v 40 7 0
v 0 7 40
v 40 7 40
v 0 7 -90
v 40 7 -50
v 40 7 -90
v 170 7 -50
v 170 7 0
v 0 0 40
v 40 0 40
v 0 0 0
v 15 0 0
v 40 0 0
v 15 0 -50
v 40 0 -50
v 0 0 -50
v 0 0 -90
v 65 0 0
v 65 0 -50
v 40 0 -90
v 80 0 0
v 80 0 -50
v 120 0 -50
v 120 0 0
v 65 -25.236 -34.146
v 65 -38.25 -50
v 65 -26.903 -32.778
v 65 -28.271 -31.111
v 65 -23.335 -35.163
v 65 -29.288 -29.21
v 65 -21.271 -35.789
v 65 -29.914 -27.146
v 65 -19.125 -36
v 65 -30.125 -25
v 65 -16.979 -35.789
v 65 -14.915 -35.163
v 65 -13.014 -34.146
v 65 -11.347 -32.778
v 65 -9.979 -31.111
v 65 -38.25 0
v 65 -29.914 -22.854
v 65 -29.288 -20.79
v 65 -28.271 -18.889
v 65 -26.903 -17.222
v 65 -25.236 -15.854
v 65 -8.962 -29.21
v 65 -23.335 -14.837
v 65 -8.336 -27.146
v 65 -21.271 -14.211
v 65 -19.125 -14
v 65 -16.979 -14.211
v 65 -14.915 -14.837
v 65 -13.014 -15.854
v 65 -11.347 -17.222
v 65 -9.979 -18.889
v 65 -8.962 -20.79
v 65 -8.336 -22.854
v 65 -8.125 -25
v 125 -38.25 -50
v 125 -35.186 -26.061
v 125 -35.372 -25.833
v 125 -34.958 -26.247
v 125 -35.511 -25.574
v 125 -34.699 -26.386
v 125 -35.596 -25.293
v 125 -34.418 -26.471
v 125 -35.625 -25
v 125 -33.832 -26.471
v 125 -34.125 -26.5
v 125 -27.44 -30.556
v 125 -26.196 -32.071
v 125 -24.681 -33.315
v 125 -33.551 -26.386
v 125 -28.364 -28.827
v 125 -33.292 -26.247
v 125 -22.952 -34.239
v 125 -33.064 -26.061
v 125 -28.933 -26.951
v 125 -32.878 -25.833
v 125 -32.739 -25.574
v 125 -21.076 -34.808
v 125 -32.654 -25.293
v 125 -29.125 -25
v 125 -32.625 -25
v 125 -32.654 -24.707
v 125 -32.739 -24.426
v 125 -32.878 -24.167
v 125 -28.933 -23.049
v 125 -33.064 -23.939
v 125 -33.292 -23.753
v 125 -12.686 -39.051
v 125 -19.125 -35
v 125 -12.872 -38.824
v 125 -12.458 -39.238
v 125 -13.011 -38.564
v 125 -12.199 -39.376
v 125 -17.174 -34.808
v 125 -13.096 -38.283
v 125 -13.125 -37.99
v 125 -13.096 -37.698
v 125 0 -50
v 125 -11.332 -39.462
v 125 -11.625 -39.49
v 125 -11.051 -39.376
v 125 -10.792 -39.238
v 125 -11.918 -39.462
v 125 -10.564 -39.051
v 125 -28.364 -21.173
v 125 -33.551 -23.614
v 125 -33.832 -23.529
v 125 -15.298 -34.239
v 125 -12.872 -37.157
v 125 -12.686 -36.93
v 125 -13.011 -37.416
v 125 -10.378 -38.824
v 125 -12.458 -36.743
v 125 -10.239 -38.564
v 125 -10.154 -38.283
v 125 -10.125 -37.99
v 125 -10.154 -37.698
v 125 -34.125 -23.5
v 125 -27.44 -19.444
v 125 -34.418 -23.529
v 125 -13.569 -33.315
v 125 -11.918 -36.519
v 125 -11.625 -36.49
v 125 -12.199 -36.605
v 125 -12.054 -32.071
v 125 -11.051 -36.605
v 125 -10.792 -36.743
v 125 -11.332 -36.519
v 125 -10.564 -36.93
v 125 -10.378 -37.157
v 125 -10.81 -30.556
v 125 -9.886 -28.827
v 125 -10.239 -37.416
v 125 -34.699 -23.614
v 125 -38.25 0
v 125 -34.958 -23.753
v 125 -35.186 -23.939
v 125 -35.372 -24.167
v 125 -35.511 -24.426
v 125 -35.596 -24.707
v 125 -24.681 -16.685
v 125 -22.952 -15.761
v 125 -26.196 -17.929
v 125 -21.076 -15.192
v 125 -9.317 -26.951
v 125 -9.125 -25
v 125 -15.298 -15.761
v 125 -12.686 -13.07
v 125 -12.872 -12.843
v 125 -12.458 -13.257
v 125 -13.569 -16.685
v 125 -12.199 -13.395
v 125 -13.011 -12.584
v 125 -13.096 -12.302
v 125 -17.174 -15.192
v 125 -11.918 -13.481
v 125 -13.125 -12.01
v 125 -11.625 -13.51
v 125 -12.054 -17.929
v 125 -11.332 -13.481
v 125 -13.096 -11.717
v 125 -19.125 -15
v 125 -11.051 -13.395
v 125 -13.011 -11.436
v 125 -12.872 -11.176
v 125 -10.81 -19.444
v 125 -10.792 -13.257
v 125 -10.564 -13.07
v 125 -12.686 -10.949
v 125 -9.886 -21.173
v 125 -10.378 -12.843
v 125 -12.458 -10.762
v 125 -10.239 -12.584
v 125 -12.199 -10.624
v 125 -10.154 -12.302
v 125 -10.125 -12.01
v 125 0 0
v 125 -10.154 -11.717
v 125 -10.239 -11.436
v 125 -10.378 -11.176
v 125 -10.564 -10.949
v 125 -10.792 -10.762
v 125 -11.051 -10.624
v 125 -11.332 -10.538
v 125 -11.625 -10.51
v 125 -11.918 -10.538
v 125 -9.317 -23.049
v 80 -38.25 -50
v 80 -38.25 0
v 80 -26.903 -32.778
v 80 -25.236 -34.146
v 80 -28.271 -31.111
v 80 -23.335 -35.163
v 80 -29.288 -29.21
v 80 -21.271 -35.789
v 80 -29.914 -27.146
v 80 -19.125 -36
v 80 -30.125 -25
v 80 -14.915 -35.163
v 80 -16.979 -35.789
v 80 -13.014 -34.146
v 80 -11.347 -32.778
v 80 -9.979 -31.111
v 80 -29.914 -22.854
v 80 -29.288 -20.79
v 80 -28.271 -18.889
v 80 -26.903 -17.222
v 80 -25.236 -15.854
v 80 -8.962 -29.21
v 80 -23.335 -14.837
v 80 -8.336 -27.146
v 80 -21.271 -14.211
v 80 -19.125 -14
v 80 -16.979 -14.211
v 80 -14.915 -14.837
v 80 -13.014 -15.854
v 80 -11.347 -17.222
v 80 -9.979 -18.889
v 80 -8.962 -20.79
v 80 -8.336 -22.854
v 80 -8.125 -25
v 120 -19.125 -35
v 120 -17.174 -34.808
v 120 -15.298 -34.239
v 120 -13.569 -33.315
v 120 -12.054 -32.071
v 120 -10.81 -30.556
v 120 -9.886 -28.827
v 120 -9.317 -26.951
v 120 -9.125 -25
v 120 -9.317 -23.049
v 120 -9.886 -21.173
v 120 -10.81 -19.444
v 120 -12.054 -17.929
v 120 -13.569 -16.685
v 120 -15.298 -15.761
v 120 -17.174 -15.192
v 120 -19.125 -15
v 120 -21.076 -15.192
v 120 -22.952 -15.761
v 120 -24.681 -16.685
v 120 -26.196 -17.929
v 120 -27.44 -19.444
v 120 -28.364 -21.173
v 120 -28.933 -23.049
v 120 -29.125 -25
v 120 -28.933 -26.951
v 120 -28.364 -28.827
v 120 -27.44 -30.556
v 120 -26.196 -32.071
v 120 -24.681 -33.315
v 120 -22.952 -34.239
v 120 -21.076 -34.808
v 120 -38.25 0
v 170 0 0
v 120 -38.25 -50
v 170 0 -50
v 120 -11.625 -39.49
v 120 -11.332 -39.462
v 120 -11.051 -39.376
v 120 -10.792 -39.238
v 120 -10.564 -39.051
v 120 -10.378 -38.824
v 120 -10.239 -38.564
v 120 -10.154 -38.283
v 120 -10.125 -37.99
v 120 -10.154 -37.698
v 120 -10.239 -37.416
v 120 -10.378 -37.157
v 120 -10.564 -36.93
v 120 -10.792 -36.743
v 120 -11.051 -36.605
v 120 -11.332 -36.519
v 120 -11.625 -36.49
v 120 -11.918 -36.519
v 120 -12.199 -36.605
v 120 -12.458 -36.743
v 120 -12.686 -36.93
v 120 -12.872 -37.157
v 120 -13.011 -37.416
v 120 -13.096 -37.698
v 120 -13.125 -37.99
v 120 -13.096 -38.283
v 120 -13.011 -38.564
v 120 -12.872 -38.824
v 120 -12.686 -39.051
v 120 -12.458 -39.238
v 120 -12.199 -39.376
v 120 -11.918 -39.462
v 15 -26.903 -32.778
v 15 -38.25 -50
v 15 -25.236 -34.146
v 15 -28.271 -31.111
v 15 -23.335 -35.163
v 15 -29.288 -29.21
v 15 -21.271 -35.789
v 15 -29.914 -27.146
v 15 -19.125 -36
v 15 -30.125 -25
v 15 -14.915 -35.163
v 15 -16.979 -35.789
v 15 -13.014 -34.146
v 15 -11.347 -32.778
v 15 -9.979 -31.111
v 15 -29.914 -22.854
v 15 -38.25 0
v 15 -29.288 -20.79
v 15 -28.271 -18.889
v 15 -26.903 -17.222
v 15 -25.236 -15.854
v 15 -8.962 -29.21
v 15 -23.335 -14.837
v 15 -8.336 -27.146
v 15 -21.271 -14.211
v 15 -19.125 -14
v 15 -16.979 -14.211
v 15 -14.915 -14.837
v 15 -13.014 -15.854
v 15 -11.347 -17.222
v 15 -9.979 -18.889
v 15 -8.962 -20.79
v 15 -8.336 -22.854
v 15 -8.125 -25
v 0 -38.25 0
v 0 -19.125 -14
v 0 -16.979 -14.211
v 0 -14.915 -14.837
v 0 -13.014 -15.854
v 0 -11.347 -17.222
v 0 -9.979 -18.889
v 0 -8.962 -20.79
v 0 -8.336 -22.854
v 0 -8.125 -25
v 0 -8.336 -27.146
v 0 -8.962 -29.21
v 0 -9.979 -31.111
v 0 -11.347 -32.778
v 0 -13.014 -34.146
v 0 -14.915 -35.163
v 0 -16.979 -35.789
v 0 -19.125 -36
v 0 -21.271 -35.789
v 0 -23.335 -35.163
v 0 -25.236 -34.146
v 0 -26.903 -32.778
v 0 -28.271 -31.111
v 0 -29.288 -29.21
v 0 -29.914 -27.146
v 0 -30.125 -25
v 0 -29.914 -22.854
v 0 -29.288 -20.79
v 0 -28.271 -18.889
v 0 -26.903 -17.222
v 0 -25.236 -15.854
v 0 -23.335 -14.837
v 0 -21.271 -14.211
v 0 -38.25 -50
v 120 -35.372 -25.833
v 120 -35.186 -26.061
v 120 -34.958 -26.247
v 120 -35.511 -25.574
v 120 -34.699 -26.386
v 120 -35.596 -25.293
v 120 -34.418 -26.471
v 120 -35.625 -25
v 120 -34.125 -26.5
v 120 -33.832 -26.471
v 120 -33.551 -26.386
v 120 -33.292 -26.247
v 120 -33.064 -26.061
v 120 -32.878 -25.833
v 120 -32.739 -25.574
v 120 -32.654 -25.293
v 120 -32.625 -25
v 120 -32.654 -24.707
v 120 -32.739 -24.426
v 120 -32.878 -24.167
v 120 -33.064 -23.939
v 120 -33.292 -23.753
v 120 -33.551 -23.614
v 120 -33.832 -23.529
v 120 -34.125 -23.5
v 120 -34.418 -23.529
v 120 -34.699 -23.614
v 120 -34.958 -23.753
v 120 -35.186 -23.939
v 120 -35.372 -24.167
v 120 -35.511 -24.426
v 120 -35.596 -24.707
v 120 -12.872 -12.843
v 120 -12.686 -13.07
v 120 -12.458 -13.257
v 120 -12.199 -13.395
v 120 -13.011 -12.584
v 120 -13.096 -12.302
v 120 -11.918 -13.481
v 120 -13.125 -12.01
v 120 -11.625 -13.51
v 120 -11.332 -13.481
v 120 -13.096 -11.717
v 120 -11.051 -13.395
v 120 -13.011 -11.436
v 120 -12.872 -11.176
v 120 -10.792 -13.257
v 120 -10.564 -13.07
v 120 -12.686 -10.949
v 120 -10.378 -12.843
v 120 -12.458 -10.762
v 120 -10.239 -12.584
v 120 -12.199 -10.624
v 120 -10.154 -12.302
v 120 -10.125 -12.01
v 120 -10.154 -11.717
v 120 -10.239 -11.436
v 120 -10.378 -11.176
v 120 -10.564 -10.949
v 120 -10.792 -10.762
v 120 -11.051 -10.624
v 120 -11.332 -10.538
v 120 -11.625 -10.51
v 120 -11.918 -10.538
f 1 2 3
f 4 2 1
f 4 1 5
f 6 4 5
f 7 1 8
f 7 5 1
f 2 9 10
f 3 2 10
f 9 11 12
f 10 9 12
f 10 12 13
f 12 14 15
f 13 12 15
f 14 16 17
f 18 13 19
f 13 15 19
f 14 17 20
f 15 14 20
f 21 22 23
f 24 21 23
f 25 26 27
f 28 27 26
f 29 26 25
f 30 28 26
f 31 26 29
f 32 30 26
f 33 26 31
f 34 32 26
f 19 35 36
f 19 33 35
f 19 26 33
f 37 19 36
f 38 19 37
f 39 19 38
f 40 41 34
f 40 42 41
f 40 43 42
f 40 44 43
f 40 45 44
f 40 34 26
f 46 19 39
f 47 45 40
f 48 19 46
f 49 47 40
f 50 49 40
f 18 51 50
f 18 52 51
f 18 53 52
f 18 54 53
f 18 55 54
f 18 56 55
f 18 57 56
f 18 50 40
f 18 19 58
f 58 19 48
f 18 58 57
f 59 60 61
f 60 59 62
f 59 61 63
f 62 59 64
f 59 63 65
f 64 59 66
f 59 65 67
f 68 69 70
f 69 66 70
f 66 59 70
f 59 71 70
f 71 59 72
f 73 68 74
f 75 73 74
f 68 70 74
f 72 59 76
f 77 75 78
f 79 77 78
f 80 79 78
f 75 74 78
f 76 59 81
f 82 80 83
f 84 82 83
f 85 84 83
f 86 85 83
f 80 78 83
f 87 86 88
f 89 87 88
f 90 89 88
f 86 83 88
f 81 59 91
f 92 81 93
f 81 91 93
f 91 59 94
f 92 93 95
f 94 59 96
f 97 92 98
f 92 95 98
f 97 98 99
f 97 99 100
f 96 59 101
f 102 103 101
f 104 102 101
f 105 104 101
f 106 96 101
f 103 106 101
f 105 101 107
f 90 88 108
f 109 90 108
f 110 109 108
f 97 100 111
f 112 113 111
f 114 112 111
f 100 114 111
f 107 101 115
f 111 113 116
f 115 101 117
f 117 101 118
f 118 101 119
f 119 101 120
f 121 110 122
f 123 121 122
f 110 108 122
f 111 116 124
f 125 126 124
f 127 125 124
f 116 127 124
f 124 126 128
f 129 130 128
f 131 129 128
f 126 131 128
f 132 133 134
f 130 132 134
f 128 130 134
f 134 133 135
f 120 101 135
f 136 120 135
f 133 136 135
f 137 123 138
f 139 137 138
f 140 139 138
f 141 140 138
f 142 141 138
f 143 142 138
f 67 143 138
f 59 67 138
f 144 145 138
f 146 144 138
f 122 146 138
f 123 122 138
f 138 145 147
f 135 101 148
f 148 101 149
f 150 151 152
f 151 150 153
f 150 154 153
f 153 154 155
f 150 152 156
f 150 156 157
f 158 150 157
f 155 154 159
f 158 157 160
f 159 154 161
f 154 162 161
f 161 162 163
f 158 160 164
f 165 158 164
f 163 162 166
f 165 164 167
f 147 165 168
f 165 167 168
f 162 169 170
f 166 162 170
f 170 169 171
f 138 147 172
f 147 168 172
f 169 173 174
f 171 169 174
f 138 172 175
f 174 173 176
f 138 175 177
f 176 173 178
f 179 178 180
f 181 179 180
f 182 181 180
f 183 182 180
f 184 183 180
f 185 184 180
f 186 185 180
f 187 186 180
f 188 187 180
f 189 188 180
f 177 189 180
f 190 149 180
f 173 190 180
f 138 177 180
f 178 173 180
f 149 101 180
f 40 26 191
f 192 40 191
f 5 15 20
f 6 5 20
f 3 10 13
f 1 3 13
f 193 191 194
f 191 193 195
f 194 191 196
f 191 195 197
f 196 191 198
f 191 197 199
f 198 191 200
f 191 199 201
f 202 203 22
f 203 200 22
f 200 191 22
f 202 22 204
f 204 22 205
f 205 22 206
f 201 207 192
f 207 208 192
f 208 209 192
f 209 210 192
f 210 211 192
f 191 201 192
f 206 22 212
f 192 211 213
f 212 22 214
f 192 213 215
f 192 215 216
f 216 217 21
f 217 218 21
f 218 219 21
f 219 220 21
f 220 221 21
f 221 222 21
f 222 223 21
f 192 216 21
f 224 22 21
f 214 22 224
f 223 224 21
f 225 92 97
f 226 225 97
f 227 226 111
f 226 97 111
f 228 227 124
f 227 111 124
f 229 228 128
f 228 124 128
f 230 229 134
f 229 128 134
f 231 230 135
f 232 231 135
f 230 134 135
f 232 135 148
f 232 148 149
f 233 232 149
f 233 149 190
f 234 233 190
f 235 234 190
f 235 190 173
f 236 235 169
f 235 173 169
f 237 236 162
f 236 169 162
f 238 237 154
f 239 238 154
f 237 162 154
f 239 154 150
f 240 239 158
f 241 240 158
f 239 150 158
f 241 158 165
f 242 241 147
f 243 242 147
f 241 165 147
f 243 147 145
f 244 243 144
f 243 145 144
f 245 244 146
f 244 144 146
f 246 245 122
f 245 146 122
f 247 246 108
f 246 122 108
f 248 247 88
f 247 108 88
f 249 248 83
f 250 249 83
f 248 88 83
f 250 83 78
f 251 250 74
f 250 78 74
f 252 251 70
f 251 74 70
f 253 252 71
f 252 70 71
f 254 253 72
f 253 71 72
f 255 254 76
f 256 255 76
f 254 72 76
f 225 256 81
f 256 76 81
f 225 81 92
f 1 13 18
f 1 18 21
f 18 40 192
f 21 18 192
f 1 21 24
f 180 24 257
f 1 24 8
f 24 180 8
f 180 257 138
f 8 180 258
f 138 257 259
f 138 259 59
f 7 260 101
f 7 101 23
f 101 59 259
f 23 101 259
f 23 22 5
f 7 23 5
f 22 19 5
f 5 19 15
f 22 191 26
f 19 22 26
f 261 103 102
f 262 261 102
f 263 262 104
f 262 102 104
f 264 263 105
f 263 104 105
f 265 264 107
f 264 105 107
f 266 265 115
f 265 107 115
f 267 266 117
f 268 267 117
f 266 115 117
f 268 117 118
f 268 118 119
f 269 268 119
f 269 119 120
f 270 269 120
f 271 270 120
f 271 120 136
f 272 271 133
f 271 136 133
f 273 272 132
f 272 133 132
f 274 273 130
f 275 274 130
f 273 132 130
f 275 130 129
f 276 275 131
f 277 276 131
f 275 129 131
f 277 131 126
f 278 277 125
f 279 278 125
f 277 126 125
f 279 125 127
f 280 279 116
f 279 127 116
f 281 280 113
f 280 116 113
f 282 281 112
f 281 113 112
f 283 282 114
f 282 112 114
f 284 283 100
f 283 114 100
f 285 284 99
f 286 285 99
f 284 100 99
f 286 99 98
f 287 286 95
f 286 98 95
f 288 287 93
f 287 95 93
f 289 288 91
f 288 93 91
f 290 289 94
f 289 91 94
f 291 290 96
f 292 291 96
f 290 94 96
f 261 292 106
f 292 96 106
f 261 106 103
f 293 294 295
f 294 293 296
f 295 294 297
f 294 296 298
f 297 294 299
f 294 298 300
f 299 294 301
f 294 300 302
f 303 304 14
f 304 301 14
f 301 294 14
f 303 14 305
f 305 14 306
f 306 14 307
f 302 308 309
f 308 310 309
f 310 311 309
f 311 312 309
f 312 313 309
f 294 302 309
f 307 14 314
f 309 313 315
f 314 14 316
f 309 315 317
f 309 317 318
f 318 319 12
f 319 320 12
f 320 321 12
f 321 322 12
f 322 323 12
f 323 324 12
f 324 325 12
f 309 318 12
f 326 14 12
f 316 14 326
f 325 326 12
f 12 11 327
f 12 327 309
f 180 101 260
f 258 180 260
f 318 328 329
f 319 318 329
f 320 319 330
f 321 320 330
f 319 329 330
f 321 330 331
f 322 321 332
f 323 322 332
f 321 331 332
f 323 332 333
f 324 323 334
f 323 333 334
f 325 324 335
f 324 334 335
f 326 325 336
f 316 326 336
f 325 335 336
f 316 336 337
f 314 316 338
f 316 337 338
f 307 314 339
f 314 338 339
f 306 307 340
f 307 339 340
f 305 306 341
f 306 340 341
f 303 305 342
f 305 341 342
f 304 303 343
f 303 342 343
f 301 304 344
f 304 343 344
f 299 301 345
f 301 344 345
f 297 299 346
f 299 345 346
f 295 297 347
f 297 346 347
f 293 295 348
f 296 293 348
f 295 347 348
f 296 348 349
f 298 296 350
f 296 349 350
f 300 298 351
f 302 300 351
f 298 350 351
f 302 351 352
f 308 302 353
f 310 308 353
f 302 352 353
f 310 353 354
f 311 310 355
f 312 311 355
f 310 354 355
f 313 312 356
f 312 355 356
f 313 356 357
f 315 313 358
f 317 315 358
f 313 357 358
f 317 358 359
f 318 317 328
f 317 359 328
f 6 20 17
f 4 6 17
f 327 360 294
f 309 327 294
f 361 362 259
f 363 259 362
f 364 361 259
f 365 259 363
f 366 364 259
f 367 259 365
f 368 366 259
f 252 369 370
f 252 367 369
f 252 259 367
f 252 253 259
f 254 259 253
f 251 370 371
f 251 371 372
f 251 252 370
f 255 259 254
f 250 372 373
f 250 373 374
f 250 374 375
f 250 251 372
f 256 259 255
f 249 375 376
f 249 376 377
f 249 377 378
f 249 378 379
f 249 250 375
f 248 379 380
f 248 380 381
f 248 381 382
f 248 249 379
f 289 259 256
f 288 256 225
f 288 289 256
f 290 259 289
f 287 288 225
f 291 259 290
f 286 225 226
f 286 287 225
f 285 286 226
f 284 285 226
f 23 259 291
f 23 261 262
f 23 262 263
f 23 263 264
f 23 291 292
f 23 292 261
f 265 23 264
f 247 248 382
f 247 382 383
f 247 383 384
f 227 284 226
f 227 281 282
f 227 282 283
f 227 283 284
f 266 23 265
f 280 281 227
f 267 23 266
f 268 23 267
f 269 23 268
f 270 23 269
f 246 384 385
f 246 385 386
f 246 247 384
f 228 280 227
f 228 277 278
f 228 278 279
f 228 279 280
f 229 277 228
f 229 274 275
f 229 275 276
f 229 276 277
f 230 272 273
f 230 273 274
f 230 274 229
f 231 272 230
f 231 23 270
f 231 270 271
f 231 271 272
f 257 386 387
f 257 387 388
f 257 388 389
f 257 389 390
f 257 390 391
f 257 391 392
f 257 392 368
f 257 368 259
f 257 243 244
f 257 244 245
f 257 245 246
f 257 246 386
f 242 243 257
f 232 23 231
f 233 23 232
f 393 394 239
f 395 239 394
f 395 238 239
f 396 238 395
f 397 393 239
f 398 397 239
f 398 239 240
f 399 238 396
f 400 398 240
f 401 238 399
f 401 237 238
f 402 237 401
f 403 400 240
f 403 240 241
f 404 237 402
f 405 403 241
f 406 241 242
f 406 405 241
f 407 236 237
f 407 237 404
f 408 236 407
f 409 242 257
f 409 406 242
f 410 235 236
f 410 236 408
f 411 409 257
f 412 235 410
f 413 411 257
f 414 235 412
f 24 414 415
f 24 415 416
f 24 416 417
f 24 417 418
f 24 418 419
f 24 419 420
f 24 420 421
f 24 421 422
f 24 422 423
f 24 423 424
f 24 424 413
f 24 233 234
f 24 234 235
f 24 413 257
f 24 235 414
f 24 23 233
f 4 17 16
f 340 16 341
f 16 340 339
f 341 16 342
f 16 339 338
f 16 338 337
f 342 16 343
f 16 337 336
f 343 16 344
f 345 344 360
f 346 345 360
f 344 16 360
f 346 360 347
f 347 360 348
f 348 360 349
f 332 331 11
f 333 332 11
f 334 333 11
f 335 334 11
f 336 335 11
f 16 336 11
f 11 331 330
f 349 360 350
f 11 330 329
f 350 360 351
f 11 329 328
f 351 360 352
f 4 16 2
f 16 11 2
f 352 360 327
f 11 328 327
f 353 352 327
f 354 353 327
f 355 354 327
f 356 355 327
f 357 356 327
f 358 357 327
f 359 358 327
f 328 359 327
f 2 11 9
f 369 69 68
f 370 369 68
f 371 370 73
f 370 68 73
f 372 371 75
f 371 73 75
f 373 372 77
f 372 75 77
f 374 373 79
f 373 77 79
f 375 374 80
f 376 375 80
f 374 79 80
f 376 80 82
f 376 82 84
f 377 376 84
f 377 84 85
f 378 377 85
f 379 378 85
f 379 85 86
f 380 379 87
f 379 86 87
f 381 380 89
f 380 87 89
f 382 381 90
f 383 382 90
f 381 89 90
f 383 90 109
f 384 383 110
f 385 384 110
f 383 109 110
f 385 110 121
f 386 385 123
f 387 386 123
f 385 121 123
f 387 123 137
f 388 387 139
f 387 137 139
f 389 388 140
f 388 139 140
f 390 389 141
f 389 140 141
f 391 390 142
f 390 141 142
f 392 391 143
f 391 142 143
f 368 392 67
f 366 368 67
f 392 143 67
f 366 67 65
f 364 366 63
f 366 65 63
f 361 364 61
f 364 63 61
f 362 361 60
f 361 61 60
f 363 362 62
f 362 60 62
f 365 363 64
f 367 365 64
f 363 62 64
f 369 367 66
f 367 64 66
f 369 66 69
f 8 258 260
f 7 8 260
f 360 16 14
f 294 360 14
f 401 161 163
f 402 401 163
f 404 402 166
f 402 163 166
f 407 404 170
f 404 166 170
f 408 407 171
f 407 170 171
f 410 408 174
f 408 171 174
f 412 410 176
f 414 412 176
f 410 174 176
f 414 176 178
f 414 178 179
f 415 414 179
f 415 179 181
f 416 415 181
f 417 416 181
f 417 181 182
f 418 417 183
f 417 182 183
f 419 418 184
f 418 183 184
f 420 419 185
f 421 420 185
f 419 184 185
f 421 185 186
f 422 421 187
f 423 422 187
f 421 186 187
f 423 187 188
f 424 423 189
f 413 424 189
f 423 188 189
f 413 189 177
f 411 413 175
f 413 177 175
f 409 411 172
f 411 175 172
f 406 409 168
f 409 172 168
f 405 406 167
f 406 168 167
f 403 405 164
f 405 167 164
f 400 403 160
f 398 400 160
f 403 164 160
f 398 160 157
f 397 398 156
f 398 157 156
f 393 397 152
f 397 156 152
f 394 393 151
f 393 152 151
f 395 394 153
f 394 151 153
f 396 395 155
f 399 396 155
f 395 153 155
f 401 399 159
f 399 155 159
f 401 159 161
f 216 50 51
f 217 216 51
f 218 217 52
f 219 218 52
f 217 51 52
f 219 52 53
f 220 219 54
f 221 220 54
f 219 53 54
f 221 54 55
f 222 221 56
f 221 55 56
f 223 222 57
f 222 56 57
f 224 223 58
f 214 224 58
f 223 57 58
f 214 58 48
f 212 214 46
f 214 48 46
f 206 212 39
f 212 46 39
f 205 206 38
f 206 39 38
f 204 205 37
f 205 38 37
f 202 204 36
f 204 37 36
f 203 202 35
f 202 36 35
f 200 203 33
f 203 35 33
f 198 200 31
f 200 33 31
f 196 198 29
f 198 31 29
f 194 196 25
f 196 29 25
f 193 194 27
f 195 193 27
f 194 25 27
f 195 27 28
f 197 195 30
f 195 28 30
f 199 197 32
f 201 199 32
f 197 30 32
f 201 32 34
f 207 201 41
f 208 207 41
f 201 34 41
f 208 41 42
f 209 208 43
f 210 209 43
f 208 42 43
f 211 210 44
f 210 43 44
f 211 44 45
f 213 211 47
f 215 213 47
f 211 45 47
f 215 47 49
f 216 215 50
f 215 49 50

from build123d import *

# Parameters (mm, degrees)
BOSS_EXTRUDE2_DEPTH = 7
SKETCH2_W           = 15
SKETCH2_H           = 50
SKETCH2_W_2         = 5
BOSS_EXTRUDE4_DEPTH = 38.25
SKETCH10_R          = 11
CUT_EXTRUDE5_DEPTH  = 15
SKETCH11_R          = 11
CUT_EXTRUDE7_DEPTH  = 15
SKETCH23_R          = 10
SKETCH23_R_2        = 1.5
CUT_EXTRUDE10_DEPTH = 5
SKETCH12_R          = 10
SKETCH12_R_2        = 1.5
CUT_EXTRUDE9_DEPTH  = 5


with BuildPart() as part:
    # Sketch1 → Boss-Extrude2 (new body)
    with BuildSketch(Plane(origin=(0, 0, 0), x_dir=(1, 0, 0), z_dir=(0, 1, 0))):
        Polygon((40, 0), (170, 0), (170, 50), (40, 50), (40, 90), (0, 90), (0, 50), (0, 0), (0, -40), (40, -40), align=None)
    extrude(amount=BOSS_EXTRUDE2_DEPTH)

    # Sketch2 → Boss-Extrude4 (add)
    with BuildSketch(Plane.XZ):
        with Locations((7.5, -25)):
            Rectangle(SKETCH2_W, SKETCH2_H)
        with Locations((72.5, -25)):
            Rectangle(SKETCH2_W, SKETCH2_H)
        with Locations((122.5, -25)):
            Rectangle(SKETCH2_W_2, SKETCH2_H)
    extrude(amount=BOSS_EXTRUDE4_DEPTH)

    # Sketch10 → Cut-Extrude5 (cut)
    with BuildSketch(Plane.ZY):
        with Locations((-25, -19.125)):
            Circle(SKETCH10_R)
    extrude(amount=-CUT_EXTRUDE5_DEPTH, mode=Mode.SUBTRACT)

    # Sketch11 → Cut-Extrude7 (cut)
    with BuildSketch(Plane.ZY.offset(-65)):
        with Locations((-25, -19.125)):
            Circle(SKETCH11_R)
    extrude(amount=-CUT_EXTRUDE7_DEPTH, mode=Mode.SUBTRACT)

    # Sketch23 → Cut-Extrude10 (cut)
    with BuildSketch(Plane(origin=(125, 0, 0), x_dir=(0, 0, -1), z_dir=(1, 0, 0))):
        with Locations((25, -19.125)):
            Circle(SKETCH23_R)
        with Locations((12.009618943, -11.625)):
            Circle(SKETCH23_R_2)
        with Locations((37.990381057, -11.625)):
            Circle(SKETCH23_R_2)
        with Locations((25, -34.125)):
            Circle(SKETCH23_R_2)
    extrude(amount=-CUT_EXTRUDE10_DEPTH, mode=Mode.SUBTRACT)

    # Sketch12 → Cut-Extrude9 (cut)
    with BuildSketch(Plane(origin=(125, 0, 0), x_dir=(0, 0, -1), z_dir=(1, 0, 0))):
        with Locations((25, -19.125)):
            Circle(SKETCH12_R)
        with Locations((12.009618943, -11.625)):
            Circle(SKETCH12_R_2)
        with Locations((37.990381057, -11.625)):
            Circle(SKETCH12_R_2)
        with Locations((25, -34.125)):
            Circle(SKETCH12_R_2)
    extrude(amount=-CUT_EXTRUDE9_DEPTH, mode=Mode.SUBTRACT)


solid = part.part
